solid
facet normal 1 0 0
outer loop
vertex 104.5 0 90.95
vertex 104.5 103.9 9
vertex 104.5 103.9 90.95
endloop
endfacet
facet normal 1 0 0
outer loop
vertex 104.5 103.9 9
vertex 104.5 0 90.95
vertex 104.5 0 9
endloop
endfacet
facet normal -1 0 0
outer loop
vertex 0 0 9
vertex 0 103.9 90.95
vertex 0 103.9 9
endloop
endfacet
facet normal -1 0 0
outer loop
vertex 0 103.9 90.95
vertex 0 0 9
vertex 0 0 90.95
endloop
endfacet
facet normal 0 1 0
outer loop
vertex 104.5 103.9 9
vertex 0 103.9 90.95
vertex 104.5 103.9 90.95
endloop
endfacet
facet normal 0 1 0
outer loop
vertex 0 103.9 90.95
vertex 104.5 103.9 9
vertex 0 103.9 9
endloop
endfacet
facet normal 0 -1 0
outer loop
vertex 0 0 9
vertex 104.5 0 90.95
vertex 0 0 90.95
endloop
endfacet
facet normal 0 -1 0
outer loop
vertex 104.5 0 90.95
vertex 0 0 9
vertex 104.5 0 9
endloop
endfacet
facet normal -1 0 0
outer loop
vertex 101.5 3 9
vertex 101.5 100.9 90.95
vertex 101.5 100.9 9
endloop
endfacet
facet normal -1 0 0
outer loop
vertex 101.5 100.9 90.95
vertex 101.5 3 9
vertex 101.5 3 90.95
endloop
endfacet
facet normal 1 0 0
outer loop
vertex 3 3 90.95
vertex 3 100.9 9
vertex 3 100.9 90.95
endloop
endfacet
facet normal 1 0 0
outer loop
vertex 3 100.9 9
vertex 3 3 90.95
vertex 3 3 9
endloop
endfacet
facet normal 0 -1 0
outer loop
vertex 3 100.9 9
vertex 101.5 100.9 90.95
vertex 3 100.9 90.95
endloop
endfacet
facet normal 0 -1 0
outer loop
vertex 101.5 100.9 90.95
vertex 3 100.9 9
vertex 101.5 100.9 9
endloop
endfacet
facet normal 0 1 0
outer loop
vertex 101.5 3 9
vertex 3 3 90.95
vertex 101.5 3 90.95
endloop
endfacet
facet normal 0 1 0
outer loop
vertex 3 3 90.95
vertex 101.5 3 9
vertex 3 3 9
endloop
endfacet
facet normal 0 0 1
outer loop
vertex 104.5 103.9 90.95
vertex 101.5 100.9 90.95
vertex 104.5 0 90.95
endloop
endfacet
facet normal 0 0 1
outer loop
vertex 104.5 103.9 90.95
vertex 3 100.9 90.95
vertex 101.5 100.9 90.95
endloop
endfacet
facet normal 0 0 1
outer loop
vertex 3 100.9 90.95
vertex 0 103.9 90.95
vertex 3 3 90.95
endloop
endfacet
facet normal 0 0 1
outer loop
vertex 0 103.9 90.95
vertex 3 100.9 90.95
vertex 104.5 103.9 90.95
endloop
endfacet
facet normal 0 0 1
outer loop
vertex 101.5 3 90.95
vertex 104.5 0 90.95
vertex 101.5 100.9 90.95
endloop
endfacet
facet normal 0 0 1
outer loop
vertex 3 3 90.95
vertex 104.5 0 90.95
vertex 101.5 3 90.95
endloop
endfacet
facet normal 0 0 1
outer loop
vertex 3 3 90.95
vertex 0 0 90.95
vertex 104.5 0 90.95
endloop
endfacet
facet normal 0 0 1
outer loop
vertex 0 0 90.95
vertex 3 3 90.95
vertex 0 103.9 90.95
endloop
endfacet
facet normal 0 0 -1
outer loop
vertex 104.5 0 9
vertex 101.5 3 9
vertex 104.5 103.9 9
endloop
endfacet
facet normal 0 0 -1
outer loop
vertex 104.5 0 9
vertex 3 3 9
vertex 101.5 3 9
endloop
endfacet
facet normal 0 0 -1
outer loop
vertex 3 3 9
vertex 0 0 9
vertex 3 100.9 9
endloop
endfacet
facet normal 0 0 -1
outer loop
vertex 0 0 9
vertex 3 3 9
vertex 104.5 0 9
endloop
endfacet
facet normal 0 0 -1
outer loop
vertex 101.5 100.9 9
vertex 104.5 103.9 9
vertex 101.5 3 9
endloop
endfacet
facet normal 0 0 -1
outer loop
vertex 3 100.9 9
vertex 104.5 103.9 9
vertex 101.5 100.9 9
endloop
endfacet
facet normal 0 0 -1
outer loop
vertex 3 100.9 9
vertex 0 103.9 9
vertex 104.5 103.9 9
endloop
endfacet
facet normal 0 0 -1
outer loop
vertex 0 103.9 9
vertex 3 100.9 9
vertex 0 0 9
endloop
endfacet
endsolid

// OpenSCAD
// file: ../lib/shell.scad
// ============================================================================
// SHELL — one solid, cut three ways
// ============================================================================
// The case is a single hollow box. base, shell and roof are that box intersected
// with three disjoint claims that together account for all of it. Cutting one solid
// rather than modelling three parts means the walls cannot disagree about where they
// are: there is one outer surface and one inner surface in the whole project.
//
// THE CLAIMS MUST BE DISJOINT AND COMPLETE. Overlapping claims print two parts that
// cannot both be in the case; claims that leave a gap print a case with a band
// missing. Both render, export and count one body. scripts/test-parts.sh checks each
// direction, because neither implies the other.
// ============================================================================

include <../config.scad>

// Seam heights. The base takes the floor plus a short skirt so its joint is off the
// floor line, and the roof takes the ceiling plus a matching skirt.
base_h = wall + 6;
roof_h = wall + 6;

assert(base_h + roof_h < outer[2],
       "base and roof skirts have eaten the whole case — nothing left for the walls");

// ----------------------------------------------------------------------------
// THE SOLID
// ----------------------------------------------------------------------------

module shellSolid() {
  difference() {
    cube(outer);
    translate([wall, wall, wall]) cube([interior_x, interior_y, interior_h]);
  }
}

// ----------------------------------------------------------------------------
// CLAIMS
// ----------------------------------------------------------------------------
// Each is [origin, size] in the case's frame, spanning the full footprint and
// differing only in z. Returned as data rather than drawn so tests.scad can reason
// about them without re-deriving the numbers.
function claim(which) =
    which == "base"  ? [[0, 0, 0],                  [outer[0], outer[1], base_h]]
  : which == "roof"  ? [[0, 0, outer[2] - roof_h],  [outer[0], outer[1], roof_h]]
  :                    [[0, 0, base_h],             [outer[0], outer[1],
                                                     outer[2] - base_h - roof_h]];

module claimVolume(which, grow = 0) {
  c = claim(which);
  translate(c[0] - [grow, grow, grow])
    cube(c[1] + [2 * grow, 2 * grow, 2 * grow]);
}

// ----------------------------------------------------------------------------
// PANELS
// ----------------------------------------------------------------------------

// render() is NOT optional. Preview does not evaluate booleans -- it flattens the
// model into a sum of products, which is exponential in nested differences. A panel
// that is the shell intersected with its claim and then cut by ports and vents passes
// OpenSCAD's normalisation limit, at which point it aborts and shows a BLANK WINDOW
// while exporting perfectly the whole time.
//
// The claim is NOT grown here. A claim grown in z would overlap its neighbour, and
// these three tile the case exactly; growth belongs on bosses and tenons, which ask
// for slightly more than they occupy so a neighbour's subtraction cannot leave a
// zero-volume skin.
module shellPanel(which) {
  render()
    intersection() {
      shellSolid();
      claimVolume(which);
    }
}
// main file
// ============================================================================
// shell — printed part
// ============================================================================
// Cut from the one shellSolid() in lib/shell.scad. Everything this part is, it is
// because of its claim; nothing here re-derives a wall position.
// ============================================================================

include <../config.scad>
use <../lib/shell.scad>

module shellPart() {
  shellPanel("shell");
}

shellPart();
